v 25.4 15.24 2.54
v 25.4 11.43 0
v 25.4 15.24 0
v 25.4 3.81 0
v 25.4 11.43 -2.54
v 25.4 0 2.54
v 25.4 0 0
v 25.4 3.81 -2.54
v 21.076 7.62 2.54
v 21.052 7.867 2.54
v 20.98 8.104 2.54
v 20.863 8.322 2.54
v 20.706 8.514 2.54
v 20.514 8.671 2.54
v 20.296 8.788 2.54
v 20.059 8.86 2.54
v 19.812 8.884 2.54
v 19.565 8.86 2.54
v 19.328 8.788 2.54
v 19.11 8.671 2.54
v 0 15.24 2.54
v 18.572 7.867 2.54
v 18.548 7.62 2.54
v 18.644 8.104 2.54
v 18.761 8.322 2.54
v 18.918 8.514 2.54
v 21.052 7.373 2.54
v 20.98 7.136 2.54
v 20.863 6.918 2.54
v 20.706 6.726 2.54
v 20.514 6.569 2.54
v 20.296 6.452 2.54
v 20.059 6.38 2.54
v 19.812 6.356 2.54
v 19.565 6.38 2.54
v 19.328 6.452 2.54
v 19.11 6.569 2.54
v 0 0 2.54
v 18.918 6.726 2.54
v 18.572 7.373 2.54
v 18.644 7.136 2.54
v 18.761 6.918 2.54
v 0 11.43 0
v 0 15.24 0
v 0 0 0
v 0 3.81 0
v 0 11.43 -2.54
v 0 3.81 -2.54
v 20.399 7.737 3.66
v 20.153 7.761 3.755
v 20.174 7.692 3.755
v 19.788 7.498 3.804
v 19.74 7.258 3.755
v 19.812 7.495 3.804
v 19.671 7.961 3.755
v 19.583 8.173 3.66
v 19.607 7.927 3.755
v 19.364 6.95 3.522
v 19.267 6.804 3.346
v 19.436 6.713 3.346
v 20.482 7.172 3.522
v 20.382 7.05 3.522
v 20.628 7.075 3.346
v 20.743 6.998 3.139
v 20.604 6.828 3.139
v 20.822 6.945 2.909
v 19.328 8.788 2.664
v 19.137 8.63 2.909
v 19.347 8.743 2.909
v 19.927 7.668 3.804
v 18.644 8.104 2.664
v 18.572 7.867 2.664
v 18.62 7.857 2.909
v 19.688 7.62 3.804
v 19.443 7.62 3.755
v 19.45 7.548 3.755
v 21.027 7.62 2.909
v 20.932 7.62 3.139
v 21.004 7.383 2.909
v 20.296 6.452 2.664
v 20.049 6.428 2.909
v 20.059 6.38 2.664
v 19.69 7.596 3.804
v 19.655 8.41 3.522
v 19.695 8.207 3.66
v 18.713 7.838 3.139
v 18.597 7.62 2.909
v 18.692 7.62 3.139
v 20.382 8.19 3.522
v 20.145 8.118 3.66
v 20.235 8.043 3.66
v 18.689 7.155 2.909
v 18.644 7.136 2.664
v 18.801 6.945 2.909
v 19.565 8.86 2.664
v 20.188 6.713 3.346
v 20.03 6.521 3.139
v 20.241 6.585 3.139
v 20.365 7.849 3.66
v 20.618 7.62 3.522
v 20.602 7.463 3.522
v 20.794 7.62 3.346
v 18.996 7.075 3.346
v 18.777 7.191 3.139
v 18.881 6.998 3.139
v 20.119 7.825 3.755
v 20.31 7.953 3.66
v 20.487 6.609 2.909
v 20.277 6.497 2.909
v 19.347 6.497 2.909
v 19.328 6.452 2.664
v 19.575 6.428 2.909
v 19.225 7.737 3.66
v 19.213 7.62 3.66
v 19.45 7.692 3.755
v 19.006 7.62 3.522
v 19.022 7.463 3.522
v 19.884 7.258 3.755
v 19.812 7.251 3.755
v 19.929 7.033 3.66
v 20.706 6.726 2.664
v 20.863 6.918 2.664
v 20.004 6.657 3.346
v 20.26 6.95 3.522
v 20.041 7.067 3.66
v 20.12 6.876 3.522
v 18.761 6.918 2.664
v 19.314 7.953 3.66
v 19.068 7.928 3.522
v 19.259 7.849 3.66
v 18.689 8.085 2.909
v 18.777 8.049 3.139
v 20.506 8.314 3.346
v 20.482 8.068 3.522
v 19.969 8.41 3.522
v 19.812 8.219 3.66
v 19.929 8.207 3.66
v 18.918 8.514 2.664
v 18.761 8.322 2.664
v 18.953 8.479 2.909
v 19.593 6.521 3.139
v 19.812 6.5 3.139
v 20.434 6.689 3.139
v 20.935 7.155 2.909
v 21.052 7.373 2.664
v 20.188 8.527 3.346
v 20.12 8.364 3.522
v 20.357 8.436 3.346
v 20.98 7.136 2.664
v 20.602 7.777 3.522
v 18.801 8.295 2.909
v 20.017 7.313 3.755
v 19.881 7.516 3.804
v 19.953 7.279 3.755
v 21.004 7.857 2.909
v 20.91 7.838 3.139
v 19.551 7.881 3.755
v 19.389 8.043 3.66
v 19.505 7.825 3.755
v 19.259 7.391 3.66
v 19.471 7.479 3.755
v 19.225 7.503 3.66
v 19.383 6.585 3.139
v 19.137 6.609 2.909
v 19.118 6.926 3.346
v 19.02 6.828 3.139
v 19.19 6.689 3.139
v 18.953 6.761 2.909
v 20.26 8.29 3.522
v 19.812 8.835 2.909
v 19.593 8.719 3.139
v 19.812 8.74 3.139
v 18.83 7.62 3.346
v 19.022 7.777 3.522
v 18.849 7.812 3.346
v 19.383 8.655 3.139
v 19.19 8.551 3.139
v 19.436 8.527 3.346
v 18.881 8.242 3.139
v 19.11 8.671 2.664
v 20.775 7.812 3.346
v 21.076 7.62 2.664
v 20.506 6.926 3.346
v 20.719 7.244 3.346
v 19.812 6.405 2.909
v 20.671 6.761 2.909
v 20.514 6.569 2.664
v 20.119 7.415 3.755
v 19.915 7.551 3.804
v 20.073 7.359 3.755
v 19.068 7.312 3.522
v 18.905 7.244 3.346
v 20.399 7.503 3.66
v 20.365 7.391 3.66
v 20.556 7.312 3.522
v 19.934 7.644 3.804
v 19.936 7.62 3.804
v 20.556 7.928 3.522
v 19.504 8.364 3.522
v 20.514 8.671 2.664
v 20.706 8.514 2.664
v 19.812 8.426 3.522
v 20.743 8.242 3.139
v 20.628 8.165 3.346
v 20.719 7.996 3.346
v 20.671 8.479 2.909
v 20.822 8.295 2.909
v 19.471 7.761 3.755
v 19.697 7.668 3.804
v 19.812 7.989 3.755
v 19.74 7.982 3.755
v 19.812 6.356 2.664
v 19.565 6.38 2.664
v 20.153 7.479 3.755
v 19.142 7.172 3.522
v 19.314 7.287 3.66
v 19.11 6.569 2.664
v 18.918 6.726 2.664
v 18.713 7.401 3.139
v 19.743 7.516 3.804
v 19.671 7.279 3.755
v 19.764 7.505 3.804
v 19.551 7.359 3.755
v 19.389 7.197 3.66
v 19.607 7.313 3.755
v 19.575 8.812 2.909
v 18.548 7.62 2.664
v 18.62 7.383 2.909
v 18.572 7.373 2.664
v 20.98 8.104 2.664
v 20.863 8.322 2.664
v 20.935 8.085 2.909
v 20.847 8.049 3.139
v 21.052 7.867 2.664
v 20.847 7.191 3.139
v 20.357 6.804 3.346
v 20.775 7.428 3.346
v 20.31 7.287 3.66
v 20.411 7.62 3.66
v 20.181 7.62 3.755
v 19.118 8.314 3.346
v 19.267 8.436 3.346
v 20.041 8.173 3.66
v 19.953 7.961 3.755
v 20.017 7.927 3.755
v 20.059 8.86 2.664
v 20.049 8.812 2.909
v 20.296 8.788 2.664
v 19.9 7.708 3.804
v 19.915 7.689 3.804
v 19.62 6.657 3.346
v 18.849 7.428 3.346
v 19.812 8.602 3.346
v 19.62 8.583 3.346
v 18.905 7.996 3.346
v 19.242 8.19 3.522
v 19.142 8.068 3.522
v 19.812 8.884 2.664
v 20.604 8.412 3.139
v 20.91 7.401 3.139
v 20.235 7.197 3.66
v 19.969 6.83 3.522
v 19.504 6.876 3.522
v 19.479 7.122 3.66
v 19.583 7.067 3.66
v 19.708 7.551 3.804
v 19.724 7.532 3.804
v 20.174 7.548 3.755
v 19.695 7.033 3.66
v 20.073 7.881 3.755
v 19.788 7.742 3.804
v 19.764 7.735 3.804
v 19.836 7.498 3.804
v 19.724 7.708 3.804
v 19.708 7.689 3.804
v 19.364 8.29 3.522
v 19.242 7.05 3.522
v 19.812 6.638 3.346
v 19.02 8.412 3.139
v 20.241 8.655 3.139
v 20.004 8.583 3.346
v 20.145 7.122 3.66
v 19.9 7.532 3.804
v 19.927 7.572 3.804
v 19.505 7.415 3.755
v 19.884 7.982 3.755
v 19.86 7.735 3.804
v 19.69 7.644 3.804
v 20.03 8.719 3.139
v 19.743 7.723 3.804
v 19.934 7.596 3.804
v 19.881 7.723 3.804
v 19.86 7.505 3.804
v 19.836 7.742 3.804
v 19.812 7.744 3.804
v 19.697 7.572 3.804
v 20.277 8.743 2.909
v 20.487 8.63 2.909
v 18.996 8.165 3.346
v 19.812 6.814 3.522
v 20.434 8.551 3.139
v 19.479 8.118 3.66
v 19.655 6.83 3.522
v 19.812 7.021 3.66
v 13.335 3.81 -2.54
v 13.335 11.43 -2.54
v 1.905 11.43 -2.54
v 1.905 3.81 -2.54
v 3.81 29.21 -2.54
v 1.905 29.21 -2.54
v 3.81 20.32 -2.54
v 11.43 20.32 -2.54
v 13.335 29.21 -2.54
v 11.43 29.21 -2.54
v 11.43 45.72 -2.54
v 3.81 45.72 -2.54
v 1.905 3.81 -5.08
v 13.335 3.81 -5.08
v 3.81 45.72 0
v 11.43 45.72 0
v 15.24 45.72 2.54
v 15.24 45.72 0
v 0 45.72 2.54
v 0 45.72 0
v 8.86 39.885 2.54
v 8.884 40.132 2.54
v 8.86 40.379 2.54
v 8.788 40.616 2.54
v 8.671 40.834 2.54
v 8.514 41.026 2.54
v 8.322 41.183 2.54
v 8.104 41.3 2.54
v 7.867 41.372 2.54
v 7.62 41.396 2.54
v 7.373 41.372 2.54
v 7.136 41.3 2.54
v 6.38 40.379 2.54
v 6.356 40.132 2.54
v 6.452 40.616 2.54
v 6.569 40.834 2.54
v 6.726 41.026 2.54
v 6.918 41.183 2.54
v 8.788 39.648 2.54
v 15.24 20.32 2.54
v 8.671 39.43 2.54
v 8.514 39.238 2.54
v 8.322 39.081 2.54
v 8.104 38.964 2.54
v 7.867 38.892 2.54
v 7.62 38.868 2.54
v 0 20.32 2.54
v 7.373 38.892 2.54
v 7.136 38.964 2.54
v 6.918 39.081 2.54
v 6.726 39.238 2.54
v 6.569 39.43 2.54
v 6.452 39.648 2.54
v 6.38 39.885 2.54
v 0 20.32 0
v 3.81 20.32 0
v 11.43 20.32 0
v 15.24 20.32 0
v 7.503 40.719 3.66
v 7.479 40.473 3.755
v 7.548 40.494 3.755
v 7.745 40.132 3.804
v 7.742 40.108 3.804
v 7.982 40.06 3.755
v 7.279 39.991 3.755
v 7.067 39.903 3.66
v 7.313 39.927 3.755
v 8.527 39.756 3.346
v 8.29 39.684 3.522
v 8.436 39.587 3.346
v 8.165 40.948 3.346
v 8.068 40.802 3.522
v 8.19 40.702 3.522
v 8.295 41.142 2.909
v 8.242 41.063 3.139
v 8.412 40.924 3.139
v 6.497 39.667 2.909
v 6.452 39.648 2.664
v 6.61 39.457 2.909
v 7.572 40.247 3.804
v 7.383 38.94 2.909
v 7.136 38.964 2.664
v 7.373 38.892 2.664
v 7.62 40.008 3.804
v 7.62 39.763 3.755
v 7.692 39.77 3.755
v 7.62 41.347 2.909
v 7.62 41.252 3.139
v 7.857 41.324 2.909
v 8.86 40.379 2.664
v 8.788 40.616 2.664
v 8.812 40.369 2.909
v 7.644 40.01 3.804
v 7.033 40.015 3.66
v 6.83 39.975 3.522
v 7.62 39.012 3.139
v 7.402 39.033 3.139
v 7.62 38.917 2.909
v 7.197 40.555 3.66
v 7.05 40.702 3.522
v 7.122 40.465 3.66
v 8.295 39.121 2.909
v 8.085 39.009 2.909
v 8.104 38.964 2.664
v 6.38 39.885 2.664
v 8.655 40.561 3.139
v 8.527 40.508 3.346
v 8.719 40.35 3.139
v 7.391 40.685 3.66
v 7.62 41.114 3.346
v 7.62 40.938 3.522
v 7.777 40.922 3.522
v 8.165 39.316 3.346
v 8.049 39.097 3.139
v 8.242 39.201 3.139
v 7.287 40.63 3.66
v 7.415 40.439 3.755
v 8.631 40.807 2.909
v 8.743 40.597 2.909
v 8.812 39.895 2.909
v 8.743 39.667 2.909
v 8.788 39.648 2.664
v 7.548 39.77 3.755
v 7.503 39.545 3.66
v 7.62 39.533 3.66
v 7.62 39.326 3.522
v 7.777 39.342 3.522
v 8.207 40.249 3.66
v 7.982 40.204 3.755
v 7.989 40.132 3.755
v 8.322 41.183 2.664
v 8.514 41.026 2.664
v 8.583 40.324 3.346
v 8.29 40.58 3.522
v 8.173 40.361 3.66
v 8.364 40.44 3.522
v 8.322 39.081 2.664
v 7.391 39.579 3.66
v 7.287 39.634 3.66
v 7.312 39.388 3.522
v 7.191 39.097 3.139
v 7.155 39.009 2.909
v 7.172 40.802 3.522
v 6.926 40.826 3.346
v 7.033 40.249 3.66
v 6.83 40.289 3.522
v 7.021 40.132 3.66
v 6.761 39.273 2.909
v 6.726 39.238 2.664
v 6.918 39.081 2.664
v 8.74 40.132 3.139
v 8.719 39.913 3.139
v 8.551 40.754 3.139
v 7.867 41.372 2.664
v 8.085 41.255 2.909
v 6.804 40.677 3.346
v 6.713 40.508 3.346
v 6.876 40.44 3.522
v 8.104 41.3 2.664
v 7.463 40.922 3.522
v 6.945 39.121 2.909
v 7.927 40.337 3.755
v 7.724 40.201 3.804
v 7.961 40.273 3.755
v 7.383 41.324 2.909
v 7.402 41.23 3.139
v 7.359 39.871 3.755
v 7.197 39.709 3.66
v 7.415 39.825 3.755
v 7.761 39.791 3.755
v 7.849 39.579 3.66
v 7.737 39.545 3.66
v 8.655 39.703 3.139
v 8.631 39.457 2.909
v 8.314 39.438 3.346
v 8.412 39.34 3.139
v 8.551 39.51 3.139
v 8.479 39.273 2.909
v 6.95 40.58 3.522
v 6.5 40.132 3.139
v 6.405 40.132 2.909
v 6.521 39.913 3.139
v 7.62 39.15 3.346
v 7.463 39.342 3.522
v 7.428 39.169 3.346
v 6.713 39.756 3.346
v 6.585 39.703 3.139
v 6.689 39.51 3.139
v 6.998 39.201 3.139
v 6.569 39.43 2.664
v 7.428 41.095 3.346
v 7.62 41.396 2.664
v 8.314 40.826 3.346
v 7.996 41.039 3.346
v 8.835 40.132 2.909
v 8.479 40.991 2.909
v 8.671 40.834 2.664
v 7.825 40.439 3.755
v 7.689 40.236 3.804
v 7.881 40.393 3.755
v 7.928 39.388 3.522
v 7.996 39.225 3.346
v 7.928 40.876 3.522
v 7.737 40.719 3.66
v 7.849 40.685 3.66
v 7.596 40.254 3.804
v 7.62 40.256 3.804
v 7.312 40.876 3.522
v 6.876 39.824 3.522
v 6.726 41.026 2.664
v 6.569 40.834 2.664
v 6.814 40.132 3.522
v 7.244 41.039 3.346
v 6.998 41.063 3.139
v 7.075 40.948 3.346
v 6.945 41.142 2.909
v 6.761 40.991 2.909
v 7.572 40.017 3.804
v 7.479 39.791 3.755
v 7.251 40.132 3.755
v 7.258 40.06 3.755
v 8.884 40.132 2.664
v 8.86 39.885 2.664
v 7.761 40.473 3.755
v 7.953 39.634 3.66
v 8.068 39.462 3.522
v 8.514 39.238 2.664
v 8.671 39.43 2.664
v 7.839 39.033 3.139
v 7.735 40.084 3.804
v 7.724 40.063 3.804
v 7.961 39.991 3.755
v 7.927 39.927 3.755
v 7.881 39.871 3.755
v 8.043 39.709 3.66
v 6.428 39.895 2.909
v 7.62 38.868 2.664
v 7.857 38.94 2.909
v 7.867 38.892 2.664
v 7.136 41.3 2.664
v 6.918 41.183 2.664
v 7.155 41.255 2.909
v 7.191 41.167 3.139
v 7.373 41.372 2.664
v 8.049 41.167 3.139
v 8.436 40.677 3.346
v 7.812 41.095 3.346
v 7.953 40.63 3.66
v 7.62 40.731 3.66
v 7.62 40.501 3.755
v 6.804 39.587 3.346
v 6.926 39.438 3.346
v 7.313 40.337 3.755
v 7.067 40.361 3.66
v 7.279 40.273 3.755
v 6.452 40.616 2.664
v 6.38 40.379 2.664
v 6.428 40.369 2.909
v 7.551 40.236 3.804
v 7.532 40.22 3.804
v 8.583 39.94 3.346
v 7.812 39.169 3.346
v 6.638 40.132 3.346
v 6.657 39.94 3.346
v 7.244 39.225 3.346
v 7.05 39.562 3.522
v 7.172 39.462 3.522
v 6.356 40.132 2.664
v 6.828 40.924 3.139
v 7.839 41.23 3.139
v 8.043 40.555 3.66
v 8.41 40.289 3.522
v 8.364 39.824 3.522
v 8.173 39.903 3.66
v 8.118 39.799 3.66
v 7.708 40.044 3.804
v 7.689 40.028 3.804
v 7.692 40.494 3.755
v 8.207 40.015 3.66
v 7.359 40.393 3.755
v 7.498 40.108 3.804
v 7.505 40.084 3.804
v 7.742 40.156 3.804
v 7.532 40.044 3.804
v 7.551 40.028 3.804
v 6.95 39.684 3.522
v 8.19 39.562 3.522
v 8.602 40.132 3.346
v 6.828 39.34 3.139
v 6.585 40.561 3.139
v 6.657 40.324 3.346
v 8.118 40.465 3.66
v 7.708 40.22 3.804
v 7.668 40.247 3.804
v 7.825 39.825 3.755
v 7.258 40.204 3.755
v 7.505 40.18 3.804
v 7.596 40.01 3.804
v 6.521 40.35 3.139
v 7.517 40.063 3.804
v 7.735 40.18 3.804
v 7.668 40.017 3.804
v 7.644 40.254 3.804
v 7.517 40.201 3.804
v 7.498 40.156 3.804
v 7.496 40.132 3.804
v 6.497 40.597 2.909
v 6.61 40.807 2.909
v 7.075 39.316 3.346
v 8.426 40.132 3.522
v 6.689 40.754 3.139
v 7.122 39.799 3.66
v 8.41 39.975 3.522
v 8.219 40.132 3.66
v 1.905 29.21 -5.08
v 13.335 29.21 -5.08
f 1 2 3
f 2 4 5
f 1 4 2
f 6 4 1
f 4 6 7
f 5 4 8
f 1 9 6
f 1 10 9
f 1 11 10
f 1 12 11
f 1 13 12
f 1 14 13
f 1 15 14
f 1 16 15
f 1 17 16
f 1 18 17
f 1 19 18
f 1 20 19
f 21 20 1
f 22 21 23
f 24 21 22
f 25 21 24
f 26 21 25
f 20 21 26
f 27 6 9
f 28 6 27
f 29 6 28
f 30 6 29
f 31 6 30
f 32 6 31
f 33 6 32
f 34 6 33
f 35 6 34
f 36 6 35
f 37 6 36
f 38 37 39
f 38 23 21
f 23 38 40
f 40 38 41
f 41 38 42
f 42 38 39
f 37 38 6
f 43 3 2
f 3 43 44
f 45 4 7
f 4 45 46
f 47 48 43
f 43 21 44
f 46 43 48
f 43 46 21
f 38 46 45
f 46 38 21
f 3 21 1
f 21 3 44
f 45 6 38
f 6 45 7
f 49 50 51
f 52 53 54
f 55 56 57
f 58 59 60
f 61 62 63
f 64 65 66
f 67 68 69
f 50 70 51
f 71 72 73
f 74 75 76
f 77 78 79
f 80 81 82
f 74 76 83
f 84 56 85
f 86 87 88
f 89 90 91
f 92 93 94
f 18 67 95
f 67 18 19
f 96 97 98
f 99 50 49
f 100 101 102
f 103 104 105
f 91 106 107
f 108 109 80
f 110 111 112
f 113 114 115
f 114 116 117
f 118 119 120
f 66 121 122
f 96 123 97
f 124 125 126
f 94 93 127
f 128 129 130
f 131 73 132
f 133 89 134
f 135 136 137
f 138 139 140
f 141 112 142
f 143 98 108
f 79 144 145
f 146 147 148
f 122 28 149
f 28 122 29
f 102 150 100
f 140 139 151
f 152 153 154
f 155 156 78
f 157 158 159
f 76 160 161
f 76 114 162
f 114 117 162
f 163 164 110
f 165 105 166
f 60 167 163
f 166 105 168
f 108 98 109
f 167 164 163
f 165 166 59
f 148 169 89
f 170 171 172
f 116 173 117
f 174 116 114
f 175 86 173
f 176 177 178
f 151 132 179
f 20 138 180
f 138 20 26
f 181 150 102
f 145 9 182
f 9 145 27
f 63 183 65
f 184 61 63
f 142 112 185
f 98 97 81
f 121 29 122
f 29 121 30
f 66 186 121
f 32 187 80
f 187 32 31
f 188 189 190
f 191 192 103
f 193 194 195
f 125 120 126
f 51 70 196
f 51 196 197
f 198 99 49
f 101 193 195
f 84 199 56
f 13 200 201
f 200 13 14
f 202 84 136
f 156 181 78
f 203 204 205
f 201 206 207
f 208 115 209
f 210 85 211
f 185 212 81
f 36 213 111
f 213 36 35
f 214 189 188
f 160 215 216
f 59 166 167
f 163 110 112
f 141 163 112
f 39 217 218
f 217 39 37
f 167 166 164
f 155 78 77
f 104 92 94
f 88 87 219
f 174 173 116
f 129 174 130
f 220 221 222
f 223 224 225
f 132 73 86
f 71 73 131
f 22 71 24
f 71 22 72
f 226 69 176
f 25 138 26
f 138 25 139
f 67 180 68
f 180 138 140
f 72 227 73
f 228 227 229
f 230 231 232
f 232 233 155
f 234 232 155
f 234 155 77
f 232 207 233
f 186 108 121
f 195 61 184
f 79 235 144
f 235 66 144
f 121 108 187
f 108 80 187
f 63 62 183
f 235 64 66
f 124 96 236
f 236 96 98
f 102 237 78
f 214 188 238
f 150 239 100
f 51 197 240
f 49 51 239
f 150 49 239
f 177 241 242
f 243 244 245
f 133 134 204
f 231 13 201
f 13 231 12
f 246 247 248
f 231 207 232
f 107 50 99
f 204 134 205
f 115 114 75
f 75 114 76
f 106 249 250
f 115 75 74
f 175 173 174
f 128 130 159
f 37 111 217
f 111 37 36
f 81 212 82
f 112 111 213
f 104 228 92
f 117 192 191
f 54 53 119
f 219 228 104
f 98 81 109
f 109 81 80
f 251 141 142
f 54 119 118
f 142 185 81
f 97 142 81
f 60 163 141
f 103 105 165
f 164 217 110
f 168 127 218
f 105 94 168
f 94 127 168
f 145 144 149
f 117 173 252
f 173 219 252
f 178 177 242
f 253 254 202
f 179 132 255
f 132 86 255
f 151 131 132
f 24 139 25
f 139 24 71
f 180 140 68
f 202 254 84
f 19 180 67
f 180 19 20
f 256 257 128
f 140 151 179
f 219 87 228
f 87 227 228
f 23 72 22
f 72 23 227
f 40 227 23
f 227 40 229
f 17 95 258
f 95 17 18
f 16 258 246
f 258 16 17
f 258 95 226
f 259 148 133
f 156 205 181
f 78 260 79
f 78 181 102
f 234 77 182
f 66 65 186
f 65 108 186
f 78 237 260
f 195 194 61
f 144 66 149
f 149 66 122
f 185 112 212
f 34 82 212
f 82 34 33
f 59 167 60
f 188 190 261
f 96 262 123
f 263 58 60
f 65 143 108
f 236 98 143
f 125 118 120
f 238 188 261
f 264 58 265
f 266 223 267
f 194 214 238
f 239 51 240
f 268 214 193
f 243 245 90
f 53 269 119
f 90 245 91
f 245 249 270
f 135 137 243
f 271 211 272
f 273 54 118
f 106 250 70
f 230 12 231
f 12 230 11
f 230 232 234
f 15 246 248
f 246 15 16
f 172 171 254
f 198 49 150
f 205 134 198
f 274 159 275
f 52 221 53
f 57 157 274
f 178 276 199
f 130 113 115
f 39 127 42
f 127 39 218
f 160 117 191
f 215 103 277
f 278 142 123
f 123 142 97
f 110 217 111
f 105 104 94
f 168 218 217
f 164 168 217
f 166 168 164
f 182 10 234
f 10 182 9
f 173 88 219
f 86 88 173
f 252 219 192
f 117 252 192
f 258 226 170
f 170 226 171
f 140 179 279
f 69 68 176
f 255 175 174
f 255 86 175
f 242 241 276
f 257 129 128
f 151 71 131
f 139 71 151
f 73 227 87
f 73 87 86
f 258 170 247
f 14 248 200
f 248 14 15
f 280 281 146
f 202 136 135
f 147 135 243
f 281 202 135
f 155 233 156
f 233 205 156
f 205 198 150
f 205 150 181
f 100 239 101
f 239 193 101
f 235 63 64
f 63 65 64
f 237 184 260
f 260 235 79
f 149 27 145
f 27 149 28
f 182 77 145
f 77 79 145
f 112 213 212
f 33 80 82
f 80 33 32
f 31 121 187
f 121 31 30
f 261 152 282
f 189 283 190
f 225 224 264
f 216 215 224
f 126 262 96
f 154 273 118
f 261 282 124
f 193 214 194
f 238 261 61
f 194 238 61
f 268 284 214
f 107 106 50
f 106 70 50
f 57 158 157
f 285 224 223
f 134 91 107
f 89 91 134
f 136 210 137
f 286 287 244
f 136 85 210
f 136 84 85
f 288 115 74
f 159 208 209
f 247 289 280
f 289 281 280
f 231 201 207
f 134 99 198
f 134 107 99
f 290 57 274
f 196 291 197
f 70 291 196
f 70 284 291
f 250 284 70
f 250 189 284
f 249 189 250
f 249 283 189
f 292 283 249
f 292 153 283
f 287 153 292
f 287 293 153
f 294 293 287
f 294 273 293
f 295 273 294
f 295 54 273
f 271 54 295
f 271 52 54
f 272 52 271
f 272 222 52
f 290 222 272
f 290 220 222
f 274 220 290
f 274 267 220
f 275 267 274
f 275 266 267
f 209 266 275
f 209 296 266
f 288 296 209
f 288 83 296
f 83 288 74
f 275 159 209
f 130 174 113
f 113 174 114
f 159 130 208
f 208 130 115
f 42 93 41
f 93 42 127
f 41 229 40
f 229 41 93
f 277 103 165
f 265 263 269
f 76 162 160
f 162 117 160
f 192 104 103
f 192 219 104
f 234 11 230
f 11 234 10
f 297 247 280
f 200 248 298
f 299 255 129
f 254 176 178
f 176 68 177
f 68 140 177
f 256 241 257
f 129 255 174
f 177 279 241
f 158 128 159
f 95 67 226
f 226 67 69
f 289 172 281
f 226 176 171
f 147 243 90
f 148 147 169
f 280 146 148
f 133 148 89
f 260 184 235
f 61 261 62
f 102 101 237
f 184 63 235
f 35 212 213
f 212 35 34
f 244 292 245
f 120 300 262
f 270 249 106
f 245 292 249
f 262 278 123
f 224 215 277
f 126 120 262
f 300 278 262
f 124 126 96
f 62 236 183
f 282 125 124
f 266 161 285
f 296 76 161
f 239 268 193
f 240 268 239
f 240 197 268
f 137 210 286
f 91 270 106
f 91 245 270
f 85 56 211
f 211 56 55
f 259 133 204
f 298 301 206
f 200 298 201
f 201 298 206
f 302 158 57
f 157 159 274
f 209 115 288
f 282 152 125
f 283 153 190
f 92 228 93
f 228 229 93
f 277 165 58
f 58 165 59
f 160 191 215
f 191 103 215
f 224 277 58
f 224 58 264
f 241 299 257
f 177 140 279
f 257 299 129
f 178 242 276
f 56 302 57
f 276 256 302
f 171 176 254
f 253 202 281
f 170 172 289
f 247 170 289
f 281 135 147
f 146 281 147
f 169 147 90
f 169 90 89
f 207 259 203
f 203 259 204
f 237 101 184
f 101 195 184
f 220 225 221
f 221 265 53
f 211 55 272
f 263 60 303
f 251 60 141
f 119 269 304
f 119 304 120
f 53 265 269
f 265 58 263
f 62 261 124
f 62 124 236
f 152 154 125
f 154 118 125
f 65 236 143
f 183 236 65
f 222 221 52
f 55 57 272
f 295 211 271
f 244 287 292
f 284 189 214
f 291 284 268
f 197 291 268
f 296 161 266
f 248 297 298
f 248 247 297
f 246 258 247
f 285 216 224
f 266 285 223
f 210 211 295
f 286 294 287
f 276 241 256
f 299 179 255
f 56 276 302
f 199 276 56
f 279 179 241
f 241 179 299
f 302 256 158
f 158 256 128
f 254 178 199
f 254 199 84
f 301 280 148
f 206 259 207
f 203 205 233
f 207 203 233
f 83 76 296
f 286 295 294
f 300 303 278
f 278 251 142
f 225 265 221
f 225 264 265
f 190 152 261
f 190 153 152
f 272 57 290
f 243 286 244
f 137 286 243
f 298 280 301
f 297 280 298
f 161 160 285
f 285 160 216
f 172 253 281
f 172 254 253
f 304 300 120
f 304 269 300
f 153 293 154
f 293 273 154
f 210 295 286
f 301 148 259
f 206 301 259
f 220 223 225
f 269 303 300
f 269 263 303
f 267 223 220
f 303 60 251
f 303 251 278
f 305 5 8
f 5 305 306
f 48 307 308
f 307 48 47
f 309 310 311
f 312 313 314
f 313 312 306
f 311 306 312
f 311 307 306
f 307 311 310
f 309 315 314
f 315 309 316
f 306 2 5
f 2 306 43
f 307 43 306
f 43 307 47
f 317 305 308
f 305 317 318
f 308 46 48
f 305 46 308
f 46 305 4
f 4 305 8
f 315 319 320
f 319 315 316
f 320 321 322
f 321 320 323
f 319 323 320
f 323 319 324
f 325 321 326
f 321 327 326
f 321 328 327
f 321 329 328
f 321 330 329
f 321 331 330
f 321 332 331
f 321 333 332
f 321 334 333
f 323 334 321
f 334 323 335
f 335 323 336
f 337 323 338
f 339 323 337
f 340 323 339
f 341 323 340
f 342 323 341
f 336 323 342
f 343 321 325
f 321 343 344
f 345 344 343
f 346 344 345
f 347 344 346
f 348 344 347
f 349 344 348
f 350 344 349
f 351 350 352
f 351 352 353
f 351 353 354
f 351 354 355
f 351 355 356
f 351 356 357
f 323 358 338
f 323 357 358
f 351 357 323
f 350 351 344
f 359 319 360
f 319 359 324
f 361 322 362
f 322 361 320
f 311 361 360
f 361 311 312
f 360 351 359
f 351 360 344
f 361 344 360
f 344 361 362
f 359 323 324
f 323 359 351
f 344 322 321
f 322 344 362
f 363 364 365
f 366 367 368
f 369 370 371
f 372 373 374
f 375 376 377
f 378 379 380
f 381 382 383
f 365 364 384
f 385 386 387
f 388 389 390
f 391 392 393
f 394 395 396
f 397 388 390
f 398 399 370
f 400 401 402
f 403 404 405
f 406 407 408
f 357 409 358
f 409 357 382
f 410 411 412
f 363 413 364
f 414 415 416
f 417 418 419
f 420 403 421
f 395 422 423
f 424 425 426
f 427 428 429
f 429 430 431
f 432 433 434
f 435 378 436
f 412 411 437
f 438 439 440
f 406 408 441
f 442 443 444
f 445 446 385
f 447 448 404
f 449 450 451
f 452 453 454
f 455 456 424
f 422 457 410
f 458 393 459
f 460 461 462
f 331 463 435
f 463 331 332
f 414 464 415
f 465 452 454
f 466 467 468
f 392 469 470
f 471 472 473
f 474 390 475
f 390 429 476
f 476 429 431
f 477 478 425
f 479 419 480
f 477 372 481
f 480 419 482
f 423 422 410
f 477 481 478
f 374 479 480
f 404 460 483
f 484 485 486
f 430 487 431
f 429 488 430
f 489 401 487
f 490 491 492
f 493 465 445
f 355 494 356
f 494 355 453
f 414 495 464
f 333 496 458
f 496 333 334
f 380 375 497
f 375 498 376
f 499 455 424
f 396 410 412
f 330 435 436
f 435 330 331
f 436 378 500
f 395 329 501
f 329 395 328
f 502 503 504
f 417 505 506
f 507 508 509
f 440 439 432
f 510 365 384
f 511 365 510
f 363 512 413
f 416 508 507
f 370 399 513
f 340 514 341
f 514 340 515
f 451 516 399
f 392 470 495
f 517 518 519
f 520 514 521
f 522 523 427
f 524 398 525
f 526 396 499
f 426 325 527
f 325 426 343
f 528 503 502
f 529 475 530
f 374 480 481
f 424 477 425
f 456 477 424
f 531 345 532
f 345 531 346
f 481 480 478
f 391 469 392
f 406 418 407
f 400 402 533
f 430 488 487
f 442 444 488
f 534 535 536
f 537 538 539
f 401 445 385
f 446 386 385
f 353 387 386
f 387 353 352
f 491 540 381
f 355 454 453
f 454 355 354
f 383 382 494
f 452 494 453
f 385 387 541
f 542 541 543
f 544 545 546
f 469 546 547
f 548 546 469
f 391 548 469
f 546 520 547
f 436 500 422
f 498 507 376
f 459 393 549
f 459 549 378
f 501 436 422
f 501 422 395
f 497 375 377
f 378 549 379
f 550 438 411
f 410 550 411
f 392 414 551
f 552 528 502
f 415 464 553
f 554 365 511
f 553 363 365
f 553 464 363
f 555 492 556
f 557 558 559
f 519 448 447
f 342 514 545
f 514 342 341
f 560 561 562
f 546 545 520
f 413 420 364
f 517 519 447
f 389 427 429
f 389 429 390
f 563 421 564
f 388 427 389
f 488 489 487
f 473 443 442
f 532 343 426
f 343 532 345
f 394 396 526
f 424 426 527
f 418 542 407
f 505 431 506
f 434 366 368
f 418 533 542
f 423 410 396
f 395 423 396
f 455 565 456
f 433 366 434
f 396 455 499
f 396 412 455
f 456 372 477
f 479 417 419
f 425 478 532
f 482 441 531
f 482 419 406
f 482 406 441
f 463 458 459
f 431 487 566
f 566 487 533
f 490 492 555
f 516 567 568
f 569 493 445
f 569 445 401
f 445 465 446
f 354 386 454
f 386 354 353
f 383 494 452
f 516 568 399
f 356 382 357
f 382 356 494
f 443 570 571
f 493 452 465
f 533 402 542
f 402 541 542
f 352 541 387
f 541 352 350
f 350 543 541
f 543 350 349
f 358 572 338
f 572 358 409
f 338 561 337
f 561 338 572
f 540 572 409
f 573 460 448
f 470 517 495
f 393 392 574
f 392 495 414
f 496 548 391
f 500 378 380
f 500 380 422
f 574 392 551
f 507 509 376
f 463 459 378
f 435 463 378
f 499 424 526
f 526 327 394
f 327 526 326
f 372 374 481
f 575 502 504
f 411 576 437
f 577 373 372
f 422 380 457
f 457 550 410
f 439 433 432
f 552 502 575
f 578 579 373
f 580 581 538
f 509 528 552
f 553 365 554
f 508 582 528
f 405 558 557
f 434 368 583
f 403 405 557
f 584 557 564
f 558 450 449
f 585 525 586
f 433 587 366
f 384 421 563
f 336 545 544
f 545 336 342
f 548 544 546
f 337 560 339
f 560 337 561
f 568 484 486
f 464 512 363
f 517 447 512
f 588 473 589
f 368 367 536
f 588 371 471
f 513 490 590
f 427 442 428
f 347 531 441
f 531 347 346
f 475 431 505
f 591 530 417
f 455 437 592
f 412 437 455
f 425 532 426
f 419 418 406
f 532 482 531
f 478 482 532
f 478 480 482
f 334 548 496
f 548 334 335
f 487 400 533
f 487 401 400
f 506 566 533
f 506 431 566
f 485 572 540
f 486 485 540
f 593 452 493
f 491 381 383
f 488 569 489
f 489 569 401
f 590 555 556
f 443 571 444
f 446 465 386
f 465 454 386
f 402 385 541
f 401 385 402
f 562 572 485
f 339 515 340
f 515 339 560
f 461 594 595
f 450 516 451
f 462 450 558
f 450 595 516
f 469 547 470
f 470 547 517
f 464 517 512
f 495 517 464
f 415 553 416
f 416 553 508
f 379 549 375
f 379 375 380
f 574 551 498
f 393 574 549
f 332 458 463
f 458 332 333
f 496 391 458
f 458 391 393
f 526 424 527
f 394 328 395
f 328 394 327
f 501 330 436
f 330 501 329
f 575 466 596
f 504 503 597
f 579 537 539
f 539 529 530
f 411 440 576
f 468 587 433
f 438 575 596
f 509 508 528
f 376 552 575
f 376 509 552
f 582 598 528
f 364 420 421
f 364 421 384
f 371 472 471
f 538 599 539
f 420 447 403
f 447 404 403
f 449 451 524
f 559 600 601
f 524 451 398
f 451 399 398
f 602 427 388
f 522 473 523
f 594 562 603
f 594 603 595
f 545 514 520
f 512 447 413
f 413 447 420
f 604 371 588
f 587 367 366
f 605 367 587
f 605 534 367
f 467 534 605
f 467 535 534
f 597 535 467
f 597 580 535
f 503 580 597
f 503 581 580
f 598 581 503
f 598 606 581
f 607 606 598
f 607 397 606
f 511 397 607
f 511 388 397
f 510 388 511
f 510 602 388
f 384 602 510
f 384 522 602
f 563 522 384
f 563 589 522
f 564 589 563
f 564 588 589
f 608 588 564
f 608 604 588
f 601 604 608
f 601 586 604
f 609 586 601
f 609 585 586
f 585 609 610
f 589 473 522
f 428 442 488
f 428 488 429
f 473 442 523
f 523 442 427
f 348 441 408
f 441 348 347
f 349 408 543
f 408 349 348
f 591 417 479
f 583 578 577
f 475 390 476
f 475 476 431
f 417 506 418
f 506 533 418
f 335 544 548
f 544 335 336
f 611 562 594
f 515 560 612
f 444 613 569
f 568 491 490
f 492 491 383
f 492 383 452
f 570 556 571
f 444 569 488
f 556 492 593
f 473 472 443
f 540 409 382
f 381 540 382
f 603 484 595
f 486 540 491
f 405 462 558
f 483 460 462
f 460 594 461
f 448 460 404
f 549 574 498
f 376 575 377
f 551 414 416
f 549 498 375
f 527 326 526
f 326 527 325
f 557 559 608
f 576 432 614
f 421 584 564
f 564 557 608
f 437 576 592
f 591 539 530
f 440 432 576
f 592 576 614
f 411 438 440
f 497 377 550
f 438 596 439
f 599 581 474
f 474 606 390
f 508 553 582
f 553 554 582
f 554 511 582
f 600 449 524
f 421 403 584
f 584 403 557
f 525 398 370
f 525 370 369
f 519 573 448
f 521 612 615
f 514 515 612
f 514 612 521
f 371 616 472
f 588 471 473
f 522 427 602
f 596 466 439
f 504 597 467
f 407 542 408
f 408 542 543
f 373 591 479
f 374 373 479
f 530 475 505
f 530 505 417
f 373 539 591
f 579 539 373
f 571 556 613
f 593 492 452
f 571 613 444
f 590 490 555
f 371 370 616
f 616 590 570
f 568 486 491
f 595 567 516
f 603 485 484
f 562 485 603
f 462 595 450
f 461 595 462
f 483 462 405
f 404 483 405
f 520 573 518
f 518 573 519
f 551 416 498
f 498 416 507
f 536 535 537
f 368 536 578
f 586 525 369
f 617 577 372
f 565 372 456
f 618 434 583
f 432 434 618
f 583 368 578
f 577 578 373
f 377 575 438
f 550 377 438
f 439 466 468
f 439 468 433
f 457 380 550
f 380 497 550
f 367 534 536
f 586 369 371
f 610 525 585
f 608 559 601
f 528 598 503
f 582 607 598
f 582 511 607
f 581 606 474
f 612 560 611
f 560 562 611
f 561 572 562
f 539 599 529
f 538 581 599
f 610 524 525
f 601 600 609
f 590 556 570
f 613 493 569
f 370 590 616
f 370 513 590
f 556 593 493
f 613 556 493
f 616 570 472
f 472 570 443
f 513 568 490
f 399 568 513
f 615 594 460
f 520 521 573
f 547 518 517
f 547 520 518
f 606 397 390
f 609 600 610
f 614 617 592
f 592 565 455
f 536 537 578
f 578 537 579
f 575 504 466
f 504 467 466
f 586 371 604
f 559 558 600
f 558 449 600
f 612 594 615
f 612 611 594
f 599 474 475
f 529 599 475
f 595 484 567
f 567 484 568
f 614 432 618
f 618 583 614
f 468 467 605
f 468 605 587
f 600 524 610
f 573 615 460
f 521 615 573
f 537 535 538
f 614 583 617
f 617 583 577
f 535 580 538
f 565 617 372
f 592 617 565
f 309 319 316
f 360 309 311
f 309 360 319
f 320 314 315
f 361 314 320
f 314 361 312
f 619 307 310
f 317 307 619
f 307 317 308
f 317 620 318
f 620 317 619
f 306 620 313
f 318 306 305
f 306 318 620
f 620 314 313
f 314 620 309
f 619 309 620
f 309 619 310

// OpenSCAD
// file: FlaviaPrims.scad
// all measurements in inches
$fn=32; // round things are drawn in 32 segments

InnerWidth = 0.6;
SlotWidth = 0.3;
InnerThickness = 0.1;
TabLength = 1.0;
Offset = 0.125; 
JoinerWidth = SlotWidth * 1.5;

DoveTailSlotMul = 1.10;

BumpDia = 0.1;
BumpOffset = TabLength - 0.22; 

module GussetHub() {
  translate([-0.5*InnerWidth, -0.5 * InnerWidth, 0])
    cube([InnerWidth, InnerWidth, InnerThickness]);
}

module GussetPlate() {
  rotate([180, 0, 0]) translate([0.25*TabLength, -0.5 * InnerWidth, 0]) InnerPlate();
}

module InnerPlate() {
  cube([TabLength, InnerWidth, InnerThickness], false);
  translate([BumpOffset, InnerWidth * 0.5, InnerThickness]) sphere(d=BumpDia);
}

module InnerPlateBump() {
  InnerPlate();
  yoff = 0.5 * (InnerWidth - SlotWidth);
  translate([0, yoff, -InnerThickness]) cube([TabLength, SlotWidth, InnerThickness], false);
}

module JoinerPlate() {
  cube([TabLength, JoinerWidth, InnerThickness]);
}


module Tab() {
  translate([Offset, 0, -InnerThickness / 2]) InnerPlate(); 
}

module Hub() {
  rotate([-90, 0, 0]) cylinder(d = Offset * 2.2, h = InnerWidth); 
}

module F2x60() {
  Tab();
  rotate([0, -60, 0]) Tab();
}

module F3x60() {
  Tab();
  rotate([0, -60, 0]) Tab();
  rotate([0, -120, 0]) Tab();  
}

module F4x60() {
  F2x60();
  rotate([0, -120, 0]) F2x60();
}

module Corner() {
  InnerPlateBump();
  xshift = InnerWidth; // 0.5 * (TabLength - InnerWidth);
  yshift = InnerWidth + 0.2;
  translate([xshift, yshift, 0]) rotate([0, 0, 90]) InnerPlateBump();
  xjshift = JoinerWidth + 0.5 * (InnerWidth - JoinerWidth);
  yjshift = 0.5 * (InnerWidth - SlotWidth);
  translate([xjshift, yjshift, -2 * InnerThickness]) rotate([0, 0, 90]) JoinerPlate();
}
// main file
// H-plane 90 degree bend (corner in the plane of the flavia stick)

include <FlaviaPrims.scad>

scale([25.4,25.4,25.4]) { 
  Corner();
}
